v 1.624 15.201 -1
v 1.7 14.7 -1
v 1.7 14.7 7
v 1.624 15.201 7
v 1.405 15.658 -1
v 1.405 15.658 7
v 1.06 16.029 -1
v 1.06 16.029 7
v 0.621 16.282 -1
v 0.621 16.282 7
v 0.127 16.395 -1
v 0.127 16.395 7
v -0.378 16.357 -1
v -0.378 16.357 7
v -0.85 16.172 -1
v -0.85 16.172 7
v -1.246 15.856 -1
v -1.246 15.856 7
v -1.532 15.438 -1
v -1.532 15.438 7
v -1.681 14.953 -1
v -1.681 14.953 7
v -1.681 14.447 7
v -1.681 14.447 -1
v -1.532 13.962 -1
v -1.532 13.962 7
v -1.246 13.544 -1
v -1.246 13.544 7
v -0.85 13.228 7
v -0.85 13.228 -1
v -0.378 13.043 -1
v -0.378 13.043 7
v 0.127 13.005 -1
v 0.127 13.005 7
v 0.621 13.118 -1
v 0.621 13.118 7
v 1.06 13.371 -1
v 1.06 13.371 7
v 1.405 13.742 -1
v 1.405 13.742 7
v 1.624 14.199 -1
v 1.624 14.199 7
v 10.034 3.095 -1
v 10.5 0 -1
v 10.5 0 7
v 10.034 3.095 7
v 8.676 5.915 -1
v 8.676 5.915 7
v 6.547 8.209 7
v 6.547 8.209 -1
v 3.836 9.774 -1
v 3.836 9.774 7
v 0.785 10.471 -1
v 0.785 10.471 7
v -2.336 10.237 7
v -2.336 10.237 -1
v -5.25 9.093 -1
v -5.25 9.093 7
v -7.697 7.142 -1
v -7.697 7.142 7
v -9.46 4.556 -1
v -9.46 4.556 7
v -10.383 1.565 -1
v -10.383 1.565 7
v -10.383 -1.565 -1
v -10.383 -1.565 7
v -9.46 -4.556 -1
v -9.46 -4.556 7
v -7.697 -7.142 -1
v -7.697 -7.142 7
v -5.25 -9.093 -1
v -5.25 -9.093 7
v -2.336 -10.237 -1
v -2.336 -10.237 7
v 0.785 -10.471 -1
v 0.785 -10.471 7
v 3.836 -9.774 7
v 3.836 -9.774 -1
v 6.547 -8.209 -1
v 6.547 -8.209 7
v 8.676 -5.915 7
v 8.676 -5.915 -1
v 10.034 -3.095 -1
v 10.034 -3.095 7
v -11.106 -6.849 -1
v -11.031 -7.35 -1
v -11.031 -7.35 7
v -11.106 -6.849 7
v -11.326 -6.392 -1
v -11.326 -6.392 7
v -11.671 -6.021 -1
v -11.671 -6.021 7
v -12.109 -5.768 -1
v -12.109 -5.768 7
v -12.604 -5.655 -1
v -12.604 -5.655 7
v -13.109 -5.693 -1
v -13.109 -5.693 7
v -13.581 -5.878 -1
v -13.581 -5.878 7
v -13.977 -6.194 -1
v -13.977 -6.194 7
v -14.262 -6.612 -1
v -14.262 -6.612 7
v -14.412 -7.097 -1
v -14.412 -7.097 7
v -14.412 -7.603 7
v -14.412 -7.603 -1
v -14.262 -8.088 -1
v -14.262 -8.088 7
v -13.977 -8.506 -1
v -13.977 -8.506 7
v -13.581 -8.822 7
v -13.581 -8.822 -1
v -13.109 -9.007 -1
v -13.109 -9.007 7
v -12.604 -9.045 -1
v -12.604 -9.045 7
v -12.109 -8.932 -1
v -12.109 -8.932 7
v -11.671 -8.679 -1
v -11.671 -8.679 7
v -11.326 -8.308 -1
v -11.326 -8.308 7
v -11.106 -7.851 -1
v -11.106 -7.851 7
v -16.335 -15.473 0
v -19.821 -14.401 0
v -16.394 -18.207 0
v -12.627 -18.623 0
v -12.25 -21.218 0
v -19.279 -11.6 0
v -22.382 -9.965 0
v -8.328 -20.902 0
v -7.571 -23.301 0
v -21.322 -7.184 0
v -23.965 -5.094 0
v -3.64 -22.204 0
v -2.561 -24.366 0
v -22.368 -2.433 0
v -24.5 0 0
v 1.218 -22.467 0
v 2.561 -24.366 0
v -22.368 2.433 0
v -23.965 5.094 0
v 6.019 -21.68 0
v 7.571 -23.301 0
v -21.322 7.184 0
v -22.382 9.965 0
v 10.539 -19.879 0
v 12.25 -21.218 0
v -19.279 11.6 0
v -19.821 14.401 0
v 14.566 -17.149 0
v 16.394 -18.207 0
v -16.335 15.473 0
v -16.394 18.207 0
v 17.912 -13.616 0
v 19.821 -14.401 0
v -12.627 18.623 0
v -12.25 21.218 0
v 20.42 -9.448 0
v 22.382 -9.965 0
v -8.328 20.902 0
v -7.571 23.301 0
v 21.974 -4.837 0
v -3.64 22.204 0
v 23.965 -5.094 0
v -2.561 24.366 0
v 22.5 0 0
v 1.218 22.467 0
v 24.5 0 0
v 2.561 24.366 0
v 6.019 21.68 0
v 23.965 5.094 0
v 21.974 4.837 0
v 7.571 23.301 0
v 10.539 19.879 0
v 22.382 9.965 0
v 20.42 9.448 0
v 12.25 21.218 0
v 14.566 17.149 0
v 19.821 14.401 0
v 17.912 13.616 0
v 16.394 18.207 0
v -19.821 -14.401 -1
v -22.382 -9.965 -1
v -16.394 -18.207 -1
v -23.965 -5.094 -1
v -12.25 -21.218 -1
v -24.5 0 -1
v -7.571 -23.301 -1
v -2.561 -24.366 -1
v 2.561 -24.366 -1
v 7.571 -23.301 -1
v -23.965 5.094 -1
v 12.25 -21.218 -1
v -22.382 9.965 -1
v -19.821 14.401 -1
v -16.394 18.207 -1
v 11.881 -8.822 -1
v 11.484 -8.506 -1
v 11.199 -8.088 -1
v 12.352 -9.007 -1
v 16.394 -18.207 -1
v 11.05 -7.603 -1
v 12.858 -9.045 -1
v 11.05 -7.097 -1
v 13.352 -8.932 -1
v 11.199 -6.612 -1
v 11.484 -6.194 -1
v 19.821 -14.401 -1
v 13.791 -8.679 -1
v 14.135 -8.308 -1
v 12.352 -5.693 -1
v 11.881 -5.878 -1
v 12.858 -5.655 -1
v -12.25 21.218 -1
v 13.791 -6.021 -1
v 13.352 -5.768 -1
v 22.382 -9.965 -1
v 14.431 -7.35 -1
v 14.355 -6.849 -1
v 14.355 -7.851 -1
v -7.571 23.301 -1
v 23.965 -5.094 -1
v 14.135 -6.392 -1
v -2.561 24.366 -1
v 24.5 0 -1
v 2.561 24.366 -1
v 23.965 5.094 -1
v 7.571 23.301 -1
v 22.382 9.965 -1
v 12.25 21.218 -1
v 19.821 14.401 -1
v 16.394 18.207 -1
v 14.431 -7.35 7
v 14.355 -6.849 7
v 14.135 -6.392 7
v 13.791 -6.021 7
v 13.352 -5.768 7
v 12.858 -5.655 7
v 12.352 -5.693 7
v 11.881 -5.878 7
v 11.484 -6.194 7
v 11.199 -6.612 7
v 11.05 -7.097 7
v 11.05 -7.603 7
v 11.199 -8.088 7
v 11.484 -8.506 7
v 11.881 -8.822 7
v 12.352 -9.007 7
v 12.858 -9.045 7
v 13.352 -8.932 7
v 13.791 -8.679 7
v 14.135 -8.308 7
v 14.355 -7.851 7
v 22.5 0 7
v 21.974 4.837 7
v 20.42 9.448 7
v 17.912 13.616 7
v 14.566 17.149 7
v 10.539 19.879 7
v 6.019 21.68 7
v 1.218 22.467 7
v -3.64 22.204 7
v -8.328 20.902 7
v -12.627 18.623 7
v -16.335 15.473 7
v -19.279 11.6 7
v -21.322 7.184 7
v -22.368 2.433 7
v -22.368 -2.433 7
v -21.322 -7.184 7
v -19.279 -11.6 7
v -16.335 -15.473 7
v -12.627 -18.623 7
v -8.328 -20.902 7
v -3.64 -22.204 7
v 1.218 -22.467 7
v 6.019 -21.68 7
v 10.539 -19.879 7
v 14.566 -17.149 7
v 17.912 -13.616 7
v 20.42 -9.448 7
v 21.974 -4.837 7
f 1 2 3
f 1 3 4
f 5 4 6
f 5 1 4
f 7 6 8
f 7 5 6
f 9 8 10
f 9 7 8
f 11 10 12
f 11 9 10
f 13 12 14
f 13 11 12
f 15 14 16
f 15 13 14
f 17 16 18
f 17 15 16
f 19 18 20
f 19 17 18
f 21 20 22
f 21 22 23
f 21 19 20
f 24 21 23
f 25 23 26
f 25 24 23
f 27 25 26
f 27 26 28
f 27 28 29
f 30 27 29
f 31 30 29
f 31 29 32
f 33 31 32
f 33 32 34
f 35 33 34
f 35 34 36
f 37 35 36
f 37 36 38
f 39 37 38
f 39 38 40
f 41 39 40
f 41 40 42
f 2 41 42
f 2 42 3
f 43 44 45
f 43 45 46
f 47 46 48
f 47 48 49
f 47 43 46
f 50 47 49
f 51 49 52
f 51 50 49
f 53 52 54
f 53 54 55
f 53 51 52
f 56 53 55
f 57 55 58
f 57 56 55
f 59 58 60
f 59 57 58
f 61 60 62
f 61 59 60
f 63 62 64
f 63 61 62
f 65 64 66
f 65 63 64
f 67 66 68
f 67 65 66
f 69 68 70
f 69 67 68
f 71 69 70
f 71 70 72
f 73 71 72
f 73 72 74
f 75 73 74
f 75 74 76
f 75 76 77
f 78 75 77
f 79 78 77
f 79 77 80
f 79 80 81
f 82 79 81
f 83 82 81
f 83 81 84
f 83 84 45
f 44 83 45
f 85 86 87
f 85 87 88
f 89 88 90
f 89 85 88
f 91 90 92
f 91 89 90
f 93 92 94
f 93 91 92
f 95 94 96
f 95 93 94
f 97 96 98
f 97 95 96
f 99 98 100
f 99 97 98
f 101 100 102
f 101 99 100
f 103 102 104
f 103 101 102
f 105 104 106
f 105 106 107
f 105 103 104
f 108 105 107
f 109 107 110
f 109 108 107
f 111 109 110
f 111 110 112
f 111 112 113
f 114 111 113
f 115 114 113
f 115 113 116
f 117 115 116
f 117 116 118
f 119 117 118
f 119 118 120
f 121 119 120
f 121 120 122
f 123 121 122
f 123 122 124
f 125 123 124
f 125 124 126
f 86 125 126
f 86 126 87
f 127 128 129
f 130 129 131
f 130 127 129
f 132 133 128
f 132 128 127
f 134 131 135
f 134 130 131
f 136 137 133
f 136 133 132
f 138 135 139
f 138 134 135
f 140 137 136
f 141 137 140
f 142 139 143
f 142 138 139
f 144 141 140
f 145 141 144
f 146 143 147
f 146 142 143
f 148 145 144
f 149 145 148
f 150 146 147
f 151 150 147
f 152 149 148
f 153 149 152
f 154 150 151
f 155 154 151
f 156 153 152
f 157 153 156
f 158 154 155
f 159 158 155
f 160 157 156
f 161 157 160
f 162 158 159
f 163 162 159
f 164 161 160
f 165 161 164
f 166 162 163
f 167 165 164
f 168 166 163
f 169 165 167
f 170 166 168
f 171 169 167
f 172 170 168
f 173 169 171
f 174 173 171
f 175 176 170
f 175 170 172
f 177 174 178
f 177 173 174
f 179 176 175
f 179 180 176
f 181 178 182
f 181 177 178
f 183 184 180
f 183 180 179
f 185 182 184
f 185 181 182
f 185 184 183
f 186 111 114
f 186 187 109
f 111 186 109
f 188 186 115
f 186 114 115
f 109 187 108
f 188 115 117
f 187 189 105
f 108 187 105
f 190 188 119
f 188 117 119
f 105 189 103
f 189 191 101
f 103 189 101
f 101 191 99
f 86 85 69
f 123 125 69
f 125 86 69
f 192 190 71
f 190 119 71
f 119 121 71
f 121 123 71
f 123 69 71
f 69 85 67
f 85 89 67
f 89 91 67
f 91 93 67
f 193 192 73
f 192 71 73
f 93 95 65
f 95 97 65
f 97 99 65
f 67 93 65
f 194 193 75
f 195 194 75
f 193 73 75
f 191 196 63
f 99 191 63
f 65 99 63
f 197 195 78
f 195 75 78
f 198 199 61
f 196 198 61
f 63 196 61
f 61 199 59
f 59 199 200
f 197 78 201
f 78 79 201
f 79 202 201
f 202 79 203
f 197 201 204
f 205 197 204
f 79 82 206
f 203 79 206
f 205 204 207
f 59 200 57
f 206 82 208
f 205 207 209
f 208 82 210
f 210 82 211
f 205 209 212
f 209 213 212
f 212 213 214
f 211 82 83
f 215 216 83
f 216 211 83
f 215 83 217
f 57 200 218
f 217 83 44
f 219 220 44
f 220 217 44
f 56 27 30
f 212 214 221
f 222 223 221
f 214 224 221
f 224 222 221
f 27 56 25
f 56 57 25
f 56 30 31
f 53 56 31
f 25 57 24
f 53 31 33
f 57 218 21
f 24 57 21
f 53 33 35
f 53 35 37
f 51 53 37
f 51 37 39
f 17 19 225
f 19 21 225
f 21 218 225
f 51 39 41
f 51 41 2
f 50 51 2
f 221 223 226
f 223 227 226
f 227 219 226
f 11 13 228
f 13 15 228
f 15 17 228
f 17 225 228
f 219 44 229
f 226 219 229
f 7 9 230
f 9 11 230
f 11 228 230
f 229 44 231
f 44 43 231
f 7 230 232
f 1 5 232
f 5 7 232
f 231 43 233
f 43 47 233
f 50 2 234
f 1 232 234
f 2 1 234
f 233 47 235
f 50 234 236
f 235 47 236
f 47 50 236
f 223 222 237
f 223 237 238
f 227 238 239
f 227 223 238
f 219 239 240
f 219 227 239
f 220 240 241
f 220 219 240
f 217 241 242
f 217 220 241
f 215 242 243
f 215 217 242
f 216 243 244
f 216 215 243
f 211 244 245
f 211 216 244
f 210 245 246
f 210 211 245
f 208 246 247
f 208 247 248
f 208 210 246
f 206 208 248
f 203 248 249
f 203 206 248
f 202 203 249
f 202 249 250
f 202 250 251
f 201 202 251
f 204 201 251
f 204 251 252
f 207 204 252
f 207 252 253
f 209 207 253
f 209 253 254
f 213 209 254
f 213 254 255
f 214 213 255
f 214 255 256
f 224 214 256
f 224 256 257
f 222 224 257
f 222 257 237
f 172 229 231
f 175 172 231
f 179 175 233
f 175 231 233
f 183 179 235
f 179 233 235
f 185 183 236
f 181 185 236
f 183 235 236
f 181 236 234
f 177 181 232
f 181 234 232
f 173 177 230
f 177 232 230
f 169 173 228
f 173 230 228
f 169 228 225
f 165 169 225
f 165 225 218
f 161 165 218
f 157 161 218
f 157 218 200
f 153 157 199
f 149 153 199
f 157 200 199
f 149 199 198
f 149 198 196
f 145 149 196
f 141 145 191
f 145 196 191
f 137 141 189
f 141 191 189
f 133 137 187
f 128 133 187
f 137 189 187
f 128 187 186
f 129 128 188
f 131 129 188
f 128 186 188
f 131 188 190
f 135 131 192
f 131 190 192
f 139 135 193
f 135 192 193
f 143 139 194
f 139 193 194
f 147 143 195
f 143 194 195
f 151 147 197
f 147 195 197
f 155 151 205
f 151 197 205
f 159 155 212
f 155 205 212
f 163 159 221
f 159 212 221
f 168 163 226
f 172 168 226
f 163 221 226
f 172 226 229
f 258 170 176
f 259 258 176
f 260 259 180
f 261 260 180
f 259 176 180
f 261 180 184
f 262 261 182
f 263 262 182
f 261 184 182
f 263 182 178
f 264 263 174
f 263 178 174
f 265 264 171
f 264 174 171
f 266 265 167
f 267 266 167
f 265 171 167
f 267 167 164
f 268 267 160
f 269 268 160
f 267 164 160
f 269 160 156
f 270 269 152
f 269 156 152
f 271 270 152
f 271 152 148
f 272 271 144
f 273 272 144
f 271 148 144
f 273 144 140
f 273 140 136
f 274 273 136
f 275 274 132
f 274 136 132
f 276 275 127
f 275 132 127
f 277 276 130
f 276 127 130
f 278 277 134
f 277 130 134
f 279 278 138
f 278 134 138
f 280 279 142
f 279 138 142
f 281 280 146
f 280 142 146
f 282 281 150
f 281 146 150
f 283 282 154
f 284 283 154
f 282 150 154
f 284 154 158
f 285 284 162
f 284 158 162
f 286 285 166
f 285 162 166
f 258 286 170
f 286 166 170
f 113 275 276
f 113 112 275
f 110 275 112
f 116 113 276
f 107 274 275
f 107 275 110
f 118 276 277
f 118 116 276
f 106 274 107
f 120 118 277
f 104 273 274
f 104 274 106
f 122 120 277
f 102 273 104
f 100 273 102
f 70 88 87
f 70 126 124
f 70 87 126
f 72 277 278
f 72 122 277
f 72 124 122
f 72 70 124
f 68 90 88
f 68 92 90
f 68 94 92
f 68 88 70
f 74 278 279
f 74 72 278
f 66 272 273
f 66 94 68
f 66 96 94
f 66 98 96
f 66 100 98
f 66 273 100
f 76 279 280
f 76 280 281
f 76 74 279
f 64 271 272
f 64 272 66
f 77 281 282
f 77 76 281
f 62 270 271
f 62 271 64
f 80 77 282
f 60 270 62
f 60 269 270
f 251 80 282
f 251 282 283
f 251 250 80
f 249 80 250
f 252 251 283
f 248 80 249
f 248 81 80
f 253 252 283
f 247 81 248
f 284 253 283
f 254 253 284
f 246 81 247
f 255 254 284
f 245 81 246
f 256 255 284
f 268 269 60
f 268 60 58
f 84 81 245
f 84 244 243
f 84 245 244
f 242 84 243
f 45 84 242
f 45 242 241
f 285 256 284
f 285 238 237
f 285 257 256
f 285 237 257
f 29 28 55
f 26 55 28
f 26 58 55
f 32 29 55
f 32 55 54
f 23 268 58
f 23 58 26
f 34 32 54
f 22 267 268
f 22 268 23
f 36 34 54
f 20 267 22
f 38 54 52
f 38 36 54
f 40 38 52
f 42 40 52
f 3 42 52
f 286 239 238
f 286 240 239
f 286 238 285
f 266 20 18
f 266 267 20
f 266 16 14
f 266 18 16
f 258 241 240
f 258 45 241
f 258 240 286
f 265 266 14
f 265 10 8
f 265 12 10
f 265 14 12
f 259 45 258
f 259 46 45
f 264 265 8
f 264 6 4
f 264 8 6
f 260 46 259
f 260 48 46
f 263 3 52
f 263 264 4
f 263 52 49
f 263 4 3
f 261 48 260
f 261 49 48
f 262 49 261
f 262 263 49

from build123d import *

# Parameters (mm, degrees)
SKETCH1_R           = 22.5
SKETCH1_R_2         = 1.7
SKETCH1_R_3         = 10.5
BOSS_EXTRUDE2_DEPTH = 7
BOSS_EXTRUDE3_START = -1
SKETCH1_3_R         = 24.5
SKETCH1_3_R_2       = 1.7
SKETCH1_3_R_3       = 10.5
BOSS_EXTRUDE3_DEPTH = 1


with BuildPart() as part:
    # Sketch1 → Boss-Extrude2 (new body)
    with BuildSketch(Plane.XY):
        Circle(SKETCH1_R)
        with Locations((-12.730573436, -7.35)):
            Circle(SKETCH1_R_2, mode=Mode.SUBTRACT)
        Circle(SKETCH1_R_3, mode=Mode.SUBTRACT)
        with Locations((12.730573436, -7.35)):
            Circle(SKETCH1_R_2, mode=Mode.SUBTRACT)
        with Locations((0, 14.7)):
            Circle(SKETCH1_R_2, mode=Mode.SUBTRACT)
    extrude(amount=BOSS_EXTRUDE2_DEPTH)

    # Sketch1<3> → Boss-Extrude3 (add)
    with BuildSketch(Plane.XY.offset(BOSS_EXTRUDE3_START)):
        Circle(SKETCH1_3_R)
        with Locations((-12.730573436, -7.35)):
            Circle(SKETCH1_3_R_2, mode=Mode.SUBTRACT)
        Circle(SKETCH1_3_R_3, mode=Mode.SUBTRACT)
        with Locations((12.730573436, -7.35)):
            Circle(SKETCH1_3_R_2, mode=Mode.SUBTRACT)
        with Locations((0, 14.7)):
            Circle(SKETCH1_3_R_2, mode=Mode.SUBTRACT)
    extrude(amount=BOSS_EXTRUDE3_DEPTH)


solid = part.part
